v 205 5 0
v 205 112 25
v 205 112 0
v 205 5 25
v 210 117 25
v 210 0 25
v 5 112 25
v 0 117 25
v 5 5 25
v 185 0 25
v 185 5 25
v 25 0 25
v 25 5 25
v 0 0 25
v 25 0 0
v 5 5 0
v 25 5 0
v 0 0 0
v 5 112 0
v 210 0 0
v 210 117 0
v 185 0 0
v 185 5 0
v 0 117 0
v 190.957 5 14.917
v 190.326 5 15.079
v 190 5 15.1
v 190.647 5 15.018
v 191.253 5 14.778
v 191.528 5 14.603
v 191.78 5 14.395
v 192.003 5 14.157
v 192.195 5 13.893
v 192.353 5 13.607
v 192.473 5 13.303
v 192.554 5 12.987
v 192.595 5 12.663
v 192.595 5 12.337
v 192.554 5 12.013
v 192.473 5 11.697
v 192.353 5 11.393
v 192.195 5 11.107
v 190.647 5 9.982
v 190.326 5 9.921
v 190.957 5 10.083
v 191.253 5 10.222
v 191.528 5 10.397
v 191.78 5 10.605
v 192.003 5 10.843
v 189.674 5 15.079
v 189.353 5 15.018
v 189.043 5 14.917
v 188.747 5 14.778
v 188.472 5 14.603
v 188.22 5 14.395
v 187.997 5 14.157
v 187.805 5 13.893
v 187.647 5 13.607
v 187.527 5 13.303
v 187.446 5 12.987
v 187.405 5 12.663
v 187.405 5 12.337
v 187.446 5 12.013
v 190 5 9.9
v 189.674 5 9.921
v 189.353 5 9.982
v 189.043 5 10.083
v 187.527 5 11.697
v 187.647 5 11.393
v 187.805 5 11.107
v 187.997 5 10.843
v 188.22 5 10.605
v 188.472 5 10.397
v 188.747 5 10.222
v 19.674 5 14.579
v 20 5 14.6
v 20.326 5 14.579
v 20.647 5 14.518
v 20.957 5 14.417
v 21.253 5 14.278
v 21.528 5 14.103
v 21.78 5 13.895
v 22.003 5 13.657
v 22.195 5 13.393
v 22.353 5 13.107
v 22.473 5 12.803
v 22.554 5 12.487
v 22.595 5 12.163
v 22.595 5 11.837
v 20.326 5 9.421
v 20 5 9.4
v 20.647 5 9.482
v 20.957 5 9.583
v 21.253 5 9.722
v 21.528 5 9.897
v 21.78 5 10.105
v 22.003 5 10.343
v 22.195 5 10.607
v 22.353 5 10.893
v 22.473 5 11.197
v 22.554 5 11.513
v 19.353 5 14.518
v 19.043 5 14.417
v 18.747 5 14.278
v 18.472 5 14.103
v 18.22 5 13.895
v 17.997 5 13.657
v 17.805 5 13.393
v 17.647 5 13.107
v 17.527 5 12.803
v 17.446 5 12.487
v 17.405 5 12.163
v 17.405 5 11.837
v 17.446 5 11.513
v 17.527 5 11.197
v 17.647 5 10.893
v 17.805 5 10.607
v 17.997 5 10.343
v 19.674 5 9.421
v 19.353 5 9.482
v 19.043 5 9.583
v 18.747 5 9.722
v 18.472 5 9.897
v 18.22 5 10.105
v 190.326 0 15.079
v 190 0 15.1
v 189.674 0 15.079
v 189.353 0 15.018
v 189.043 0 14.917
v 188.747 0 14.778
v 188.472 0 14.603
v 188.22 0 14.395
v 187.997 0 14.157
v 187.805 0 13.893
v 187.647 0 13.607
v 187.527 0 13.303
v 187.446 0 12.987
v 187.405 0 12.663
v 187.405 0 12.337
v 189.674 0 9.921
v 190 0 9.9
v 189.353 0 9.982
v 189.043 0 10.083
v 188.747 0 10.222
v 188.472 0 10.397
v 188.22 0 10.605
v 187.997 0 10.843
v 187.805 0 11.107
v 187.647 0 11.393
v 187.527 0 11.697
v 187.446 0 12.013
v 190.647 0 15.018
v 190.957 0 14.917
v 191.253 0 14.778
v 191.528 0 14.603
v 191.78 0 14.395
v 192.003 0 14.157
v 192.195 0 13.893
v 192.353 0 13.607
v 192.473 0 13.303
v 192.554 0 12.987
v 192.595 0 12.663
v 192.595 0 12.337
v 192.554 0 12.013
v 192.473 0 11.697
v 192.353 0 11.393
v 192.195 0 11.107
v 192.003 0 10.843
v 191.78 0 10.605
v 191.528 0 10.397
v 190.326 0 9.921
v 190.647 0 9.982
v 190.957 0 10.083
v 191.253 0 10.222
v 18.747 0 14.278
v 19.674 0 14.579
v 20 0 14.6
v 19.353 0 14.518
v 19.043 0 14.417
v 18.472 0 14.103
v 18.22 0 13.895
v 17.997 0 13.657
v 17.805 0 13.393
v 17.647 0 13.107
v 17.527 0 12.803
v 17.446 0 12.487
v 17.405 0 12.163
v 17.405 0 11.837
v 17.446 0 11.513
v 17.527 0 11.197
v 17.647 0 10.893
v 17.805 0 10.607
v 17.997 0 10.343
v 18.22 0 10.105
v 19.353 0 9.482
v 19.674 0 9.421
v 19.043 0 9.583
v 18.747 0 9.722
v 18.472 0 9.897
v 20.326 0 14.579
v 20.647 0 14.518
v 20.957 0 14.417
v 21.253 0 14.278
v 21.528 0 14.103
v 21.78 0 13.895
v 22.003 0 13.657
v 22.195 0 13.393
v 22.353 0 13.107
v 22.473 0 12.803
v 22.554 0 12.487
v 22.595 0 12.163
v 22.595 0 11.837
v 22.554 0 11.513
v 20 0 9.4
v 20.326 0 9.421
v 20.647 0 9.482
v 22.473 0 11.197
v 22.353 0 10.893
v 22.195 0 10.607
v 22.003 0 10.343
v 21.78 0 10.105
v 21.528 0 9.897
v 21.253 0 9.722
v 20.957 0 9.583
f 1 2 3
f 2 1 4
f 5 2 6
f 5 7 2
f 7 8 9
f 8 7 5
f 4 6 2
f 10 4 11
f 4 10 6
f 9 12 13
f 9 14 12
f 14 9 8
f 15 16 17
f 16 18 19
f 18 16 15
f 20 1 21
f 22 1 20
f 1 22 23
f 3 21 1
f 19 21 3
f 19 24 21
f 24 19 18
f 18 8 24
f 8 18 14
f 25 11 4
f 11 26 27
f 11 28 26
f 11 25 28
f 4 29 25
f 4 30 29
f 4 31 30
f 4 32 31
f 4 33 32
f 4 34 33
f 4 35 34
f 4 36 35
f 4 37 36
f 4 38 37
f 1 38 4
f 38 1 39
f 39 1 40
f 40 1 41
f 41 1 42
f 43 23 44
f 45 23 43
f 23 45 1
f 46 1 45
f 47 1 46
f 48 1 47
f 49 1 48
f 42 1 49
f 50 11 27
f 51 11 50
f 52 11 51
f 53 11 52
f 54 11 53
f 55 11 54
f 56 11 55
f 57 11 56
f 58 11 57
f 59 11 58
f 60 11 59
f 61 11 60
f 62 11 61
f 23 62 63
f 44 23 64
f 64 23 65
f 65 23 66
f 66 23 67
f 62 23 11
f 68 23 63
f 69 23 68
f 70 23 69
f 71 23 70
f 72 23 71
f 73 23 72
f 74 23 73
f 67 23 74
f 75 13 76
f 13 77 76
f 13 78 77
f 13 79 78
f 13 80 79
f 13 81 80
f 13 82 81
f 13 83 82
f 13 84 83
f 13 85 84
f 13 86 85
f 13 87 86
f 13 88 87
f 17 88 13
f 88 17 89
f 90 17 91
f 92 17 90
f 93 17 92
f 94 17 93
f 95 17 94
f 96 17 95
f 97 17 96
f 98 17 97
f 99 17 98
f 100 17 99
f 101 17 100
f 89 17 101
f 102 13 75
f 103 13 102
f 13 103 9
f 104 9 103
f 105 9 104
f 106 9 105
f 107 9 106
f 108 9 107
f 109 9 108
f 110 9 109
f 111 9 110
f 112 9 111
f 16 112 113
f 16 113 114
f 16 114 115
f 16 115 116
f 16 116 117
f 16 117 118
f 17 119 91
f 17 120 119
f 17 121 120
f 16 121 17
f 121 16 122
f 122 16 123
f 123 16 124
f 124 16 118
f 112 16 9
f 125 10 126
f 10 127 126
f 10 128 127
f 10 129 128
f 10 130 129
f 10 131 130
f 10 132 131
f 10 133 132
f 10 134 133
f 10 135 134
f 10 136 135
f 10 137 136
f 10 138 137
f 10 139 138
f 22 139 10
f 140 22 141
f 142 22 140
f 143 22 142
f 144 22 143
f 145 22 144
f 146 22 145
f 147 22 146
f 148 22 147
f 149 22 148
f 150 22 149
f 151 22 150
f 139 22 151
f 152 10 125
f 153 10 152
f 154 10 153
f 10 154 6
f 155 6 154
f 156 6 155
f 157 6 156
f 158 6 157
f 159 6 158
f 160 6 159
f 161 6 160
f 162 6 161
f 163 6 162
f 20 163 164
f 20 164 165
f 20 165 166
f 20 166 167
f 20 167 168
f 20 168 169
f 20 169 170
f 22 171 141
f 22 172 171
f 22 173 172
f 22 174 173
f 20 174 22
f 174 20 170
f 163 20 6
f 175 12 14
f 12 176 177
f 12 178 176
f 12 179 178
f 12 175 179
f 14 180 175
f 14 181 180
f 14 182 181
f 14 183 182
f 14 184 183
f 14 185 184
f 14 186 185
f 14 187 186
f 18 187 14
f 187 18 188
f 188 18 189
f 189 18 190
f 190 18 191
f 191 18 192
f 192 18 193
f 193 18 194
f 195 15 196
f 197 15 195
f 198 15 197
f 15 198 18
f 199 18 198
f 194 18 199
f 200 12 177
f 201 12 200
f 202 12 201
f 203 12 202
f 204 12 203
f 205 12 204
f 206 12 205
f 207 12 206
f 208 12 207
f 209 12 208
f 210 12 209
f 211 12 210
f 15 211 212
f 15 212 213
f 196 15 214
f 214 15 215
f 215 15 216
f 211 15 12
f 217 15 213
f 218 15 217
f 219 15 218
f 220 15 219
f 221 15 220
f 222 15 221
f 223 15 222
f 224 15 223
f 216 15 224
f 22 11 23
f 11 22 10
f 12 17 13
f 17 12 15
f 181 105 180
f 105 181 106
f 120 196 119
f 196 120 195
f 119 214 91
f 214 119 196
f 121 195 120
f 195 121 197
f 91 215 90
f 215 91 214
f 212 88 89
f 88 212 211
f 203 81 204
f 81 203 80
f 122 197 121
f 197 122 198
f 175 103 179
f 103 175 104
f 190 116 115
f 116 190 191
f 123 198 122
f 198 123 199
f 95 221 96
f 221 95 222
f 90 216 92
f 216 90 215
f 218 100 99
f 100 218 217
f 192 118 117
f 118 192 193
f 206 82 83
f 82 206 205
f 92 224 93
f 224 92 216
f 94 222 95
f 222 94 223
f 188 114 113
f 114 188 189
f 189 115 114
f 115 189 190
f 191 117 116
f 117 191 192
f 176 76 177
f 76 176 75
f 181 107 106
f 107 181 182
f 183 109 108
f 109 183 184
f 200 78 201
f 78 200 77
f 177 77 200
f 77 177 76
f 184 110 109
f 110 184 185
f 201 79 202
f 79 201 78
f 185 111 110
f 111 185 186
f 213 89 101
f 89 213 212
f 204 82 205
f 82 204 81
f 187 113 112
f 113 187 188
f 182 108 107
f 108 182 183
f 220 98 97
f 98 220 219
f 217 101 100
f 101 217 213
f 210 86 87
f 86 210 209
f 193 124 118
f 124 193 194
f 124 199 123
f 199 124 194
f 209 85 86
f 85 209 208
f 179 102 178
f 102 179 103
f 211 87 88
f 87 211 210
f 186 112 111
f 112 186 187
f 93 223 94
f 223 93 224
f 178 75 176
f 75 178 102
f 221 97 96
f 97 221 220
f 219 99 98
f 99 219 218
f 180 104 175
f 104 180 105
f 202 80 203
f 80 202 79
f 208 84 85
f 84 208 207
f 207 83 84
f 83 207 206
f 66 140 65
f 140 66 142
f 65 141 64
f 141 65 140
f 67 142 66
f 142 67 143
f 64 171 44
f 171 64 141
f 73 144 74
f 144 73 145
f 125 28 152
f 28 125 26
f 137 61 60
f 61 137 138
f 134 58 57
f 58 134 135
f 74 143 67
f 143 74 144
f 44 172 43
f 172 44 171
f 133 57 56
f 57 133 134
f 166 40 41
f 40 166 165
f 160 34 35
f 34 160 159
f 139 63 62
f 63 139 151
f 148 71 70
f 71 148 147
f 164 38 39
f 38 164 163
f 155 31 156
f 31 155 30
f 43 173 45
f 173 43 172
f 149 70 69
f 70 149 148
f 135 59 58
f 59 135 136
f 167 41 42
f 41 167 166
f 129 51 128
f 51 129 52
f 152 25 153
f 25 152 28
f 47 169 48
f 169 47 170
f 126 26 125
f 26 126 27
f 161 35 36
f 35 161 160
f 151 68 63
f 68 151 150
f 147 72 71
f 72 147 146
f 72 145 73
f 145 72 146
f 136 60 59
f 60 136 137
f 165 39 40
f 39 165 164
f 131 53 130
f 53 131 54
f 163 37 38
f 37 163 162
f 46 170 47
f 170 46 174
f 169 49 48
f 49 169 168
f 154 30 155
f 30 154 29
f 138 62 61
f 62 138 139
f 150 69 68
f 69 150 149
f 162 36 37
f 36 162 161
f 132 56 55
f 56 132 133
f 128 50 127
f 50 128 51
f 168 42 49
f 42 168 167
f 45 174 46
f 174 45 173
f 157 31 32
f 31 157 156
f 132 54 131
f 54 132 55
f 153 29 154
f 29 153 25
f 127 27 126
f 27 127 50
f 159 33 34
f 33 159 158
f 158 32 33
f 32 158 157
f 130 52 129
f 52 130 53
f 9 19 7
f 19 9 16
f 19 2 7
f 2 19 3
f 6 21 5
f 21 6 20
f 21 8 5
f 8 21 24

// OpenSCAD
$fn = 50;
translate([0,0,0]) cube([5,100+12,25]);
translate([205,0,0]) cube([5,100+12,25]);

translate([0,112,0])cube([210,5,25]);

difference() {
translate([0,0,0]) cube([205,5,25]);
translate([25,0,0]) cube([160,5,25]);

#translate([20,-1,12]) rotate([0,90,90]) cylinder(7,2.6,2.6);
#translate([190,-1,12.5]) rotate([0,90,90]) cylinder(7, 2.6, 2.6);
}
